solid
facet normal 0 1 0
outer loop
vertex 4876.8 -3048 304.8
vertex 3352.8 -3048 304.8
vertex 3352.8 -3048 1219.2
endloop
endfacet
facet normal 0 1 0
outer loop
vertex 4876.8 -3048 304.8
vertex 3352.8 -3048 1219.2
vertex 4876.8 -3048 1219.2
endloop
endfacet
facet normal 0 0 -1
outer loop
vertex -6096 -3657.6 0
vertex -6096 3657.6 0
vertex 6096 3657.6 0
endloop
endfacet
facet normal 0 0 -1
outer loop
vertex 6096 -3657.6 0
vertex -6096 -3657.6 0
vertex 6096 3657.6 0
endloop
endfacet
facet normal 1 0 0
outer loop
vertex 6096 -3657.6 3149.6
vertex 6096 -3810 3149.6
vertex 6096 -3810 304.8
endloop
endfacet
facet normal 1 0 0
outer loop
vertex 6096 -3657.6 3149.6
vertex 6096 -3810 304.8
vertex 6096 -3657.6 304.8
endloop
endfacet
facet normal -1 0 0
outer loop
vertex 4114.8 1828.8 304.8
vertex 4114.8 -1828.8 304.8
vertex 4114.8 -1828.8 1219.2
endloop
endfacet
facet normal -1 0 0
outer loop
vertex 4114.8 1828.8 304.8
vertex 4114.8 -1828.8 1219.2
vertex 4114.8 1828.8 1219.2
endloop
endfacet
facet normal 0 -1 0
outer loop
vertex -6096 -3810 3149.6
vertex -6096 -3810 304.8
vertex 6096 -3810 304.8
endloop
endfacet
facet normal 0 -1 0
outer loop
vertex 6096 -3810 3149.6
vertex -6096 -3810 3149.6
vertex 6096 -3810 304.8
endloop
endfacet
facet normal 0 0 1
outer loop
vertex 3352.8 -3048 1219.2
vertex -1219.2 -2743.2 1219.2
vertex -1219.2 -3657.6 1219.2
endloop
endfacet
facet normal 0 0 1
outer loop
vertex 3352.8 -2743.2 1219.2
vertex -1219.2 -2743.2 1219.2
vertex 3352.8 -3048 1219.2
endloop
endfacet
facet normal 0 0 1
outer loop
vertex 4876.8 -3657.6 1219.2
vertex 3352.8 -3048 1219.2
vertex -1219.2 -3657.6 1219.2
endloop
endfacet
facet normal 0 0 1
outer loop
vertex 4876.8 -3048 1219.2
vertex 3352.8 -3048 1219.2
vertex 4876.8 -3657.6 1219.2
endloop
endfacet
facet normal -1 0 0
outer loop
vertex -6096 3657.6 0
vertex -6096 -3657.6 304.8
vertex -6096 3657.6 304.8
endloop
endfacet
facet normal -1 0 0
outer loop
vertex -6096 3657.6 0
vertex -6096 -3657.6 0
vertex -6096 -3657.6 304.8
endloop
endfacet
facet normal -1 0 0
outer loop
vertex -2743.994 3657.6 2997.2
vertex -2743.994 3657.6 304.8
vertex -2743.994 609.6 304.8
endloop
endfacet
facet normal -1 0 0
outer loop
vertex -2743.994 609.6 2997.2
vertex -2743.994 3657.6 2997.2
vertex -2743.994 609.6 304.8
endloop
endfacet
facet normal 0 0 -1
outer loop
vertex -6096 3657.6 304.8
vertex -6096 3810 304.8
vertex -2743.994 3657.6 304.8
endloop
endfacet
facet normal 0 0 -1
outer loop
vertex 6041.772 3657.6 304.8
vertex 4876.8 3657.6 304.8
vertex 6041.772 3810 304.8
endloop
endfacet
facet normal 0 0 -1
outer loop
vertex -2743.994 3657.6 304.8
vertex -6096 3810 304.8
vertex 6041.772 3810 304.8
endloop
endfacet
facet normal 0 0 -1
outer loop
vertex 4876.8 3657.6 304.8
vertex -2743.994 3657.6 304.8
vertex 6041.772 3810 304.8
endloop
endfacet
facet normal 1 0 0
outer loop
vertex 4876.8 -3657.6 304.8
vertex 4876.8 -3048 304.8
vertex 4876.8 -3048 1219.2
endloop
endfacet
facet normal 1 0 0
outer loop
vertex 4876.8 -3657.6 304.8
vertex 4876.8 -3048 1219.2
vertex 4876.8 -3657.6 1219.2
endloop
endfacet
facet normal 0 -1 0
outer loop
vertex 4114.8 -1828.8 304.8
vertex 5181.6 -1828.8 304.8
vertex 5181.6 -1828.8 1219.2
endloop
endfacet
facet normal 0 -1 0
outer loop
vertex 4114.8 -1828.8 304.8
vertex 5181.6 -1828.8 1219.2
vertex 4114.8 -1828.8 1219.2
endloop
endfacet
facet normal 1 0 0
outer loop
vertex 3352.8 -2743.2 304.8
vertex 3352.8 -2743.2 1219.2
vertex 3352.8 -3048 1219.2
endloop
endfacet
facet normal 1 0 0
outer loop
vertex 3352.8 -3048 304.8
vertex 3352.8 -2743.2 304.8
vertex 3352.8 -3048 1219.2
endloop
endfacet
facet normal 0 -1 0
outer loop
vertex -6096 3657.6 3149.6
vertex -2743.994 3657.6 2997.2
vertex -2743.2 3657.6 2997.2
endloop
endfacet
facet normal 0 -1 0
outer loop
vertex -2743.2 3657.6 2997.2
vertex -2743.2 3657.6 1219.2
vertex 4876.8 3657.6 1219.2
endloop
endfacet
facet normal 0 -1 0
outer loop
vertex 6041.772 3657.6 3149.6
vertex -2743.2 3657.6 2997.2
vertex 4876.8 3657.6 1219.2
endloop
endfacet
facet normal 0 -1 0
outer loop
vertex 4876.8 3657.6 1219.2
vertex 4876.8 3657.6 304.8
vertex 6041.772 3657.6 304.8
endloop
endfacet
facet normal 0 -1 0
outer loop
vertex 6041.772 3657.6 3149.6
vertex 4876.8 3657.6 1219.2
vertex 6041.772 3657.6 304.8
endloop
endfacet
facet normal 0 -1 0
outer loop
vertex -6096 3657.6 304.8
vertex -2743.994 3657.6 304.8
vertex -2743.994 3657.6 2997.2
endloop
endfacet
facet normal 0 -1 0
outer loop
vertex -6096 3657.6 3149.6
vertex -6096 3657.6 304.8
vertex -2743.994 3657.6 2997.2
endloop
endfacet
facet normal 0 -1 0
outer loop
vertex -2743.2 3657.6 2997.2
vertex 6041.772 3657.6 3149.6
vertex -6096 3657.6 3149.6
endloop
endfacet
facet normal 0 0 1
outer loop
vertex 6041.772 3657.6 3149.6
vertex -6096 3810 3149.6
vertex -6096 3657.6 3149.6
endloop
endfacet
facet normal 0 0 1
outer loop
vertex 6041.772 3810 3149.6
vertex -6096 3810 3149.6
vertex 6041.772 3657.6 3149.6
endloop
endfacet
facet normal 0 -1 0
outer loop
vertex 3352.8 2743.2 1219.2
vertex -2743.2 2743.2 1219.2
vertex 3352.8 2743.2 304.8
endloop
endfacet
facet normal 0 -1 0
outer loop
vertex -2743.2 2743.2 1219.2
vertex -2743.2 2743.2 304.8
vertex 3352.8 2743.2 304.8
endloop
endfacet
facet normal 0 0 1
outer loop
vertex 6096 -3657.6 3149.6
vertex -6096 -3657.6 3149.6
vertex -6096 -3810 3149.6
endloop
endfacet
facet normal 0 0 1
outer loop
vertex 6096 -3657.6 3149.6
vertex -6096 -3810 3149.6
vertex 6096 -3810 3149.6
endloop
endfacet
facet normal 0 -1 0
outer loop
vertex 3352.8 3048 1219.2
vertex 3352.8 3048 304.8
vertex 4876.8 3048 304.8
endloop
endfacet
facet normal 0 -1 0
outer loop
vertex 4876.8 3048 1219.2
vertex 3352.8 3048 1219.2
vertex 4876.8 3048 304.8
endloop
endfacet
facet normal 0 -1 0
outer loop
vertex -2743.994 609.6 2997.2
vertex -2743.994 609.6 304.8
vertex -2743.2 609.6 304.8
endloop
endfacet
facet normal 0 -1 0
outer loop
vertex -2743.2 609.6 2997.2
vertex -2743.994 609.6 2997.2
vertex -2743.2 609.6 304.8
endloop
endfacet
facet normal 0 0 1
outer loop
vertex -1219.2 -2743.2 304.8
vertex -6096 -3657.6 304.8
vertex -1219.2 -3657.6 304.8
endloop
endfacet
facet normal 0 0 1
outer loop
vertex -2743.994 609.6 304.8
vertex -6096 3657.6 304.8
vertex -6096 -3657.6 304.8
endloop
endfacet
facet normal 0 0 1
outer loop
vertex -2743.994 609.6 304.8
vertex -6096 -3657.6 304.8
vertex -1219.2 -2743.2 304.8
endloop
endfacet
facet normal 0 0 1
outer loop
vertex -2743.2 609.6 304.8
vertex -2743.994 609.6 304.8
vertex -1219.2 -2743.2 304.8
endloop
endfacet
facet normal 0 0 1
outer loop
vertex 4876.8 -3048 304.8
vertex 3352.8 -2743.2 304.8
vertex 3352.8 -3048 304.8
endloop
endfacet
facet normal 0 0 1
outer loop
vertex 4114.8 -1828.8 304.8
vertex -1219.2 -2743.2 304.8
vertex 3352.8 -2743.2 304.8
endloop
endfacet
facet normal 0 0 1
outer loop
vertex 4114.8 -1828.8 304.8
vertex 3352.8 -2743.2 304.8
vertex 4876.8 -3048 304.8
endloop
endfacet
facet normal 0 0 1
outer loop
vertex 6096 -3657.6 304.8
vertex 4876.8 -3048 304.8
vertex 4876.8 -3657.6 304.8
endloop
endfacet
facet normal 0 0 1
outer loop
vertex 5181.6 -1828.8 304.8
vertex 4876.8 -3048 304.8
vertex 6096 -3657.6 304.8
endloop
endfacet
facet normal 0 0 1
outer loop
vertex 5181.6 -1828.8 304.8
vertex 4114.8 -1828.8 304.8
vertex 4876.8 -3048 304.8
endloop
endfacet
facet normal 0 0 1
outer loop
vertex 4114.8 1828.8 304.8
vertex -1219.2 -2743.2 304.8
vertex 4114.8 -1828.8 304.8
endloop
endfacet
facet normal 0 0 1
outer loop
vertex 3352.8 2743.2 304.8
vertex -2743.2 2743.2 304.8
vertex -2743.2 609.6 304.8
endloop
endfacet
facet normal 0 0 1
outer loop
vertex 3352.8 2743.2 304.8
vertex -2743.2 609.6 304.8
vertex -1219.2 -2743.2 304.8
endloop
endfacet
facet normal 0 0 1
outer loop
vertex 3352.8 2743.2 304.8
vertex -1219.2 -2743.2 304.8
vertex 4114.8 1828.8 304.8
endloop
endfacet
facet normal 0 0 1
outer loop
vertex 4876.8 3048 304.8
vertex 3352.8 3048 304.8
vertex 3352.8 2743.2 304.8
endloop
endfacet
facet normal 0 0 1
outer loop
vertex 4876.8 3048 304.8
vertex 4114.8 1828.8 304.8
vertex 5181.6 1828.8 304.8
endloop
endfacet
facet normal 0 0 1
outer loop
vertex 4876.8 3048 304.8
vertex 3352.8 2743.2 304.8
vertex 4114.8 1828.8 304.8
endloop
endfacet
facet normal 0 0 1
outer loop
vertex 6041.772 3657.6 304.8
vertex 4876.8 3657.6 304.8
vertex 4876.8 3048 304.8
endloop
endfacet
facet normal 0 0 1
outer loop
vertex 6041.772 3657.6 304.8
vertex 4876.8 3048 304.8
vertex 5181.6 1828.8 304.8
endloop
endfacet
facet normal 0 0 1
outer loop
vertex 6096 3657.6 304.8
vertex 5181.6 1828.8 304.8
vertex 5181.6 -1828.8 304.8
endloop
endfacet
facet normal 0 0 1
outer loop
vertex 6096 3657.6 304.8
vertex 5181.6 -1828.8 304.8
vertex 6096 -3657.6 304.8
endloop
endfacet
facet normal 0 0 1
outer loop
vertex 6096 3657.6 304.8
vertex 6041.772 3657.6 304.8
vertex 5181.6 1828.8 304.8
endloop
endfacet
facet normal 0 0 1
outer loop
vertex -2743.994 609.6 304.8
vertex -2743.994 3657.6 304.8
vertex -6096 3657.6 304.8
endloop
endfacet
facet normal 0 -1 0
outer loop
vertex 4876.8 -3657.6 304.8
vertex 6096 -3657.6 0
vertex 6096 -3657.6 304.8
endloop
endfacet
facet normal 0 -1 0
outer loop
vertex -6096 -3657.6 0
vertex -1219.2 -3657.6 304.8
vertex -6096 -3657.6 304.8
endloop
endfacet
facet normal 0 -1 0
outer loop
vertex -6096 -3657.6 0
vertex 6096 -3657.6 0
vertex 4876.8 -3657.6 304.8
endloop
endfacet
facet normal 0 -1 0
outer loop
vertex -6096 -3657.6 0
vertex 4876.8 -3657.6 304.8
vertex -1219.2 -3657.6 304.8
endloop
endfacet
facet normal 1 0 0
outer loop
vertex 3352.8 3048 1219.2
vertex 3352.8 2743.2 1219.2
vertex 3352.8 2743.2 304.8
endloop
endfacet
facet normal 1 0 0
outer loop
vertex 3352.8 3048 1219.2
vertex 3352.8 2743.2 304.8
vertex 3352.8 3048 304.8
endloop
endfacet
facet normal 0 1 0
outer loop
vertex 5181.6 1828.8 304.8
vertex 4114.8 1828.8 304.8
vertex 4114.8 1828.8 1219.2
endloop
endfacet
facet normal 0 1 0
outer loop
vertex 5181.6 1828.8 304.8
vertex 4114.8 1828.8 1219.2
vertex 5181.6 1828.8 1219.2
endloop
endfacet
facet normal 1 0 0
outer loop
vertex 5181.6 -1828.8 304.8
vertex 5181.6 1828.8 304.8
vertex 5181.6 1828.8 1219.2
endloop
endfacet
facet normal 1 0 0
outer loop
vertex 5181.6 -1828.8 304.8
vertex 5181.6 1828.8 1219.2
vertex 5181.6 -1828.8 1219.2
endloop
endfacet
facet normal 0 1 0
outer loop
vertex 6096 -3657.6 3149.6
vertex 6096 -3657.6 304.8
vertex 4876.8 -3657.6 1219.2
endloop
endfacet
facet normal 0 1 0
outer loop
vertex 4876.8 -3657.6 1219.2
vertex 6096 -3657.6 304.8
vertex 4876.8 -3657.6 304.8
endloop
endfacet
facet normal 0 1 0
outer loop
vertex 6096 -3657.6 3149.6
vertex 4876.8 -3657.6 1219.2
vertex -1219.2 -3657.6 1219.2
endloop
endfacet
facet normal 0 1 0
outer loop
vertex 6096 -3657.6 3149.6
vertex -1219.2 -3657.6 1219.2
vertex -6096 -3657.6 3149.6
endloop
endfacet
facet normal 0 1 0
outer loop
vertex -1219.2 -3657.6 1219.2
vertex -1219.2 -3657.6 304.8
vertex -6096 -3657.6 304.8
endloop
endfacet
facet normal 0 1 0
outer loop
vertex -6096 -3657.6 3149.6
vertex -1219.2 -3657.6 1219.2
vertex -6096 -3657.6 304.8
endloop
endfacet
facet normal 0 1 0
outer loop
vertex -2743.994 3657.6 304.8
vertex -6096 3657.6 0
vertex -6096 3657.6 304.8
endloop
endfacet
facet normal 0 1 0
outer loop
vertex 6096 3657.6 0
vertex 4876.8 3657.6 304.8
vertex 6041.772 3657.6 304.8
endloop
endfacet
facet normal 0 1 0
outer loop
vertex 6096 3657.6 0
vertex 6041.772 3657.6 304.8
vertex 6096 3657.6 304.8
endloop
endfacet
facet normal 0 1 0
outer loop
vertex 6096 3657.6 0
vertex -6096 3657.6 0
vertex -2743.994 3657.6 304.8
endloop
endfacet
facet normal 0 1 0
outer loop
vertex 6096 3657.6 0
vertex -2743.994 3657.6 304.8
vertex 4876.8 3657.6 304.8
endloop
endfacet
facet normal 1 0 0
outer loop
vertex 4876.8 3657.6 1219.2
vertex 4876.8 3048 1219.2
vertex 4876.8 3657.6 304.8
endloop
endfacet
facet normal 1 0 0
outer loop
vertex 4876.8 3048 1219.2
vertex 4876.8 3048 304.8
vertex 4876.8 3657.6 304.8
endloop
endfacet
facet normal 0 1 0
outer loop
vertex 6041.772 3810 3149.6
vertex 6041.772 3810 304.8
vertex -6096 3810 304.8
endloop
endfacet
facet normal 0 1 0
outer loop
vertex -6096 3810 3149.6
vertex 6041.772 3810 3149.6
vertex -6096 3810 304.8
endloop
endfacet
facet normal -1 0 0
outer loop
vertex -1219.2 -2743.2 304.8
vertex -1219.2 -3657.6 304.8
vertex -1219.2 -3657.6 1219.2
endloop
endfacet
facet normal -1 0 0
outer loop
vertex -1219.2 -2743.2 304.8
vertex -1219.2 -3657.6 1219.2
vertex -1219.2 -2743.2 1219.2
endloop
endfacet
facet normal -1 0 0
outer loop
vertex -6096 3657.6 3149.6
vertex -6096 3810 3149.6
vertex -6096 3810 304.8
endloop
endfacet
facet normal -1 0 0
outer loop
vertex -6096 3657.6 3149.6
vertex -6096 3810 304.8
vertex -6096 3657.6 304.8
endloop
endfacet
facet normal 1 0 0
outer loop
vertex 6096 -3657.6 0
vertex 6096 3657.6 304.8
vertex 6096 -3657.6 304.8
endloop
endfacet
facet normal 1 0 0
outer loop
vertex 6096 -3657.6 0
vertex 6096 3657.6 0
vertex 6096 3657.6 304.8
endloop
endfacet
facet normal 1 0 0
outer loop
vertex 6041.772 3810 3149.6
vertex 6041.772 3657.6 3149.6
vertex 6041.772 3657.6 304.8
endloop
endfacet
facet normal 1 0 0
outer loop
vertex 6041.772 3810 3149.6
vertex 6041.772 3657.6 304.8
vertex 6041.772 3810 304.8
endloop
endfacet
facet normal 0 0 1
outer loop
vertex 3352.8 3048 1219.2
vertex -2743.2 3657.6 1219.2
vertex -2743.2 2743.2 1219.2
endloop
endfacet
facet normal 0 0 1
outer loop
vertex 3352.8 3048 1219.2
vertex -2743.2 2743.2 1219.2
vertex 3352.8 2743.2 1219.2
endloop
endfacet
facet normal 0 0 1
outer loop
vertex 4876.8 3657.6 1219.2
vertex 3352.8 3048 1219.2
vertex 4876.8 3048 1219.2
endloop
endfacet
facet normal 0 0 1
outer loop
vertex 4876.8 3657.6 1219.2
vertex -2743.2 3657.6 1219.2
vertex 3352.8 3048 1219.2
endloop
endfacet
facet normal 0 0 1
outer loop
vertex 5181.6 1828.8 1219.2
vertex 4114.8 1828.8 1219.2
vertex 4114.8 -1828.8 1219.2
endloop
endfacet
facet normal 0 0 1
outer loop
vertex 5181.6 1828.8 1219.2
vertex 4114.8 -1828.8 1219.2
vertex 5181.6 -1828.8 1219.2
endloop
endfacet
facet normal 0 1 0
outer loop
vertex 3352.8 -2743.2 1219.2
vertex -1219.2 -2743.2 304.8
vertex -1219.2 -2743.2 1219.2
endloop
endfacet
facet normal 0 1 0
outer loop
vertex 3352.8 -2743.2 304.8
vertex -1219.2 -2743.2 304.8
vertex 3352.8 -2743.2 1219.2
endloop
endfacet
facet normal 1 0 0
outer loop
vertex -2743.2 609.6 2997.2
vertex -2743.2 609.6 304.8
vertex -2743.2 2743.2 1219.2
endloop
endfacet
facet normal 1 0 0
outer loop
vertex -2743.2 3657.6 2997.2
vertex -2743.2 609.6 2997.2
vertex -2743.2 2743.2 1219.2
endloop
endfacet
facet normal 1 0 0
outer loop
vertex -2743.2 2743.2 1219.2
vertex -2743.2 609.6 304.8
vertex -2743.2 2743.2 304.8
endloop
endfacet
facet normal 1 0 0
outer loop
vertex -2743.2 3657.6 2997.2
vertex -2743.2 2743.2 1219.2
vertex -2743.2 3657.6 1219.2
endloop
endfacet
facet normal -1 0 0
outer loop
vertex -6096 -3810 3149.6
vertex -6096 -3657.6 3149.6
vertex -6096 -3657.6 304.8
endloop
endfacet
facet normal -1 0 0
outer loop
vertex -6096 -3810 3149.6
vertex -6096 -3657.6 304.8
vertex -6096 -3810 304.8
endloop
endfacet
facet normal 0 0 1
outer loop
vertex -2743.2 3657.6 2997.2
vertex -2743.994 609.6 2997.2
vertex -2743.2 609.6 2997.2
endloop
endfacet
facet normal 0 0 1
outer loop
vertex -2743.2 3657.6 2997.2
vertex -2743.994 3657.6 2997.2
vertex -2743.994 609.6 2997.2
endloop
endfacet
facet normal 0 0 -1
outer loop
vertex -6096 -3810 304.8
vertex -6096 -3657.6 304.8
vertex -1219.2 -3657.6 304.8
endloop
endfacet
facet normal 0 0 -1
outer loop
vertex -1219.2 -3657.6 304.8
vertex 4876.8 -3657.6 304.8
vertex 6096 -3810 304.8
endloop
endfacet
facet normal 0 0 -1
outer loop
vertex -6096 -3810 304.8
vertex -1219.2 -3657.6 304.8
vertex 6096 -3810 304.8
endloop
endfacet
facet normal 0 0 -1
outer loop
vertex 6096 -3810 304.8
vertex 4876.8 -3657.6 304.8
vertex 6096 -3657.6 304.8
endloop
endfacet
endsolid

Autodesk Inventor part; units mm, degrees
ref_plane "YZ Plane" through (0, 0, 0) normal (1, 0, 0) x (0, 1, 0)
ref_plane "XZ Plane" through (0, 0, 0) normal (0, 1, 0) x (-1, 0, 0)
ref_plane "XY Plane" through (0, 0, 0) normal (0, 0, 1) x (1, 0, 0)
sketch "Sketch1" plane through (0, 0, 0) normal (0, 0, 1) x (1, 0, 0)
  line L0 (6096, -3657.6) -> (-6096, -3657.6)
  line L1 (-6096, -3657.6) -> (-6096, 3657.6)
  line L2 (-6096, 3657.6) -> (6096, 3657.6)
  line L3 (6096, 3657.6) -> (6096, -3657.6)
  line L4 (6096, -3657.6) -> (-6096, 3657.6) construction
  line L5 (-6096, -3657.6) -> (6096, 3657.6) construction
  point P0 (0, 0)
  dimension "d0" = 12192
  dimension "d1" = 7315.2
extrude "Floor" add sketch "Sketch1" along normal blind 304.8
sketch "Sketch2" plane through (0, 0, 304.8) normal (0, 0, 1) x (1, 0, 0)
  line L0 (4114.8, 1828.8) -> (5181.6, 1828.8)
  line L1 (5181.6, 1828.8) -> (5181.6, -1828.8)
  line L2 (5181.6, -1828.8) -> (4114.8, -1828.8)
  line L3 (4114.8, -1828.8) -> (4114.8, 1828.8)
  line L4 (4114.8, 1828.8) -> (5181.6, -1828.8) construction
  line L5 (5181.6, 1828.8) -> (4114.8, -1828.8) construction
  line L6 (6096, -3657.6) -> (6096, 3657.6) projected
  line L7 (-6096, -3657.6) -> (6096, -3657.6) projected
  point P0 (0, 0)
  point P1 (4648.2, 0)
  dimension "d4" = 914.4
  dimension "d5" = 1828.8
  dimension "d6" = 1066.8
  dimension "d7" = 3657.6
extrude "Desk" add sketch "Sketch2" along normal blind 914.4
sketch "Sketch3" plane through (0, 0, 304.8) normal (0, 0, 1) x (1, 0, 0)
  line L0 (3352.8, -3048) -> (4876.8, -3048)
  line L1 (4876.8, -3048) -> (4876.8, -3657.6)
  line L2 (4876.8, -3657.6) -> (3352.8, -3657.6)
  line L3 (3352.8, -3657.6) -> (3352.8, -3048)
  line L4 (3352.8, -3048) -> (4876.8, -3657.6) construction
  line L5 (4876.8, -3048) -> (3352.8, -3657.6) construction
  line L6 (6096, -3657.6) -> (6096, 3657.6) projected
  line L7 (-6096, -3657.6) -> (6096, -3657.6) projected
  line L8 (-6096, 0) -> (6153.2675, 0) construction
  line L9 (3352.8, 3048) -> (4876.8, 3048)
  line L10 (4876.8, 3048) -> (4876.8, 3657.6)
  line L11 (4876.8, 3657.6) -> (3352.8, 3657.6)
  line L12 (3352.8, 3657.6) -> (3352.8, 3048)
  point P0 (0, 0)
  point P1 (4114.8, -3352.8)
  point P2 (4114.8, 3352.8)
  dimension "d10" = 609.6
  dimension "d11" = 1524
  dimension "d12" = 1219.2
  dimension "d13" = 0
extrude "Sinks" add sketch "Sketch3" along normal blind 914.4
sketch "Sketch4" plane through (0, 0, 304.8) normal (0, 0, 1) x (1, 0, 0)
  line L0 (3352.8, 3657.6) -> (-2743.2, 3657.6)
  line L1 (-2743.2, 3657.6) -> (-2743.2, 2743.2)
  line L2 (-2743.2, 2743.2) -> (3352.8, 2743.2)
  line L3 (3352.8, 2743.2) -> (3352.8, 3657.6)
  line L4 (3352.8, -3657.6) -> (4876.8, -3657.6) projected
  line L5 (3352.8, -3657.6) -> (-1219.2, -3657.6)
  line L6 (-1219.2, -3657.6) -> (-1219.2, -2743.2)
  line L7 (-1219.2, -2743.2) -> (3352.8, -2743.2)
  line L8 (3352.8, -2743.2) -> (3352.8, -3657.6)
  point P0 (0, 0)
  dimension "d16" = 914.4
  dimension "d17" = 6096
  dimension "d18" = 4572
  dimension "d19" = 914.4
extrude "Counters" add sketch "Sketch4" along normal blind 914.4
sketch "Sketch5" plane through (0, 0, 304.8) normal (0, 0, 1) x (1, 0, 0)
  line L0 (-6096, 3657.6) -> (-6096, -3657.6) projected
  line L1 (-6096, 3657.6) -> (6041.772, 3657.6)
  line L2 (6041.772, 3657.6) -> (6041.772, 3810)
  line L3 (6041.772, 3810) -> (-6096, 3810)
  line L4 (-6096, 3810) -> (-6096, 3657.6)
  line L5 (4876.8, -3657.6) -> (6096, -3657.6) projected
  line L6 (6096, -3657.6) -> (-6096, -3657.6)
  line L7 (-6096, -3657.6) -> (-6096, -3810)
  line L8 (-6096, -3810) -> (6096, -3810)
  line L9 (6096, -3810) -> (6096, -3657.6)
  point P0 (0, 0)
  dimension "d22" = 152.4
  dimension "d23" = 152.4
extrude "Room Walls" add sketch "Sketch5" along normal blind 2844.8
sketch "Sketch6" plane through (-6096, 3657.6, 304.8) normal (0, -1, 0) x (1, 0, 0)
  line L0 (12192, 0) -> (12192, 2844.8) projected
  line L1 (0, 0) -> (0, 2844.8) projected
  line L2 (12192, 2844.8) -> (0, 2844.8)
  line L3 (0, 2844.8) -> (0, 2692.4)
  line L4 (0, 2692.4) -> (12192, 2692.4)
  line L5 (12192, 2692.4) -> (12192, 2844.8)
  point P0 (6096, -304.8)
  dimension "d26" = 152.4
extrude "Roof" [suppressed]
sketch "Sketch7" plane through (0, 0, 304.8) normal (0, 0, 1) x (1, 0, 0)
  line L0 (-2743.2, 3657.6) -> (-2743.9938, 3657.6)
  line L1 (-2743.9938, 3657.6) -> (-2743.9938, 609.6)
  line L2 (-2743.9938, 609.6) -> (-2743.2, 609.6)
  line L3 (-2743.2, 609.6) -> (-2743.2, 3657.6)
  point P0 (0, 0)
  dimension "d29" = 0.7937
  dimension "d30" = 3048
extrude "Extrusion7" add sketch "Sketch7" along normal blind 2692.4
properties part number "Room3L10"
